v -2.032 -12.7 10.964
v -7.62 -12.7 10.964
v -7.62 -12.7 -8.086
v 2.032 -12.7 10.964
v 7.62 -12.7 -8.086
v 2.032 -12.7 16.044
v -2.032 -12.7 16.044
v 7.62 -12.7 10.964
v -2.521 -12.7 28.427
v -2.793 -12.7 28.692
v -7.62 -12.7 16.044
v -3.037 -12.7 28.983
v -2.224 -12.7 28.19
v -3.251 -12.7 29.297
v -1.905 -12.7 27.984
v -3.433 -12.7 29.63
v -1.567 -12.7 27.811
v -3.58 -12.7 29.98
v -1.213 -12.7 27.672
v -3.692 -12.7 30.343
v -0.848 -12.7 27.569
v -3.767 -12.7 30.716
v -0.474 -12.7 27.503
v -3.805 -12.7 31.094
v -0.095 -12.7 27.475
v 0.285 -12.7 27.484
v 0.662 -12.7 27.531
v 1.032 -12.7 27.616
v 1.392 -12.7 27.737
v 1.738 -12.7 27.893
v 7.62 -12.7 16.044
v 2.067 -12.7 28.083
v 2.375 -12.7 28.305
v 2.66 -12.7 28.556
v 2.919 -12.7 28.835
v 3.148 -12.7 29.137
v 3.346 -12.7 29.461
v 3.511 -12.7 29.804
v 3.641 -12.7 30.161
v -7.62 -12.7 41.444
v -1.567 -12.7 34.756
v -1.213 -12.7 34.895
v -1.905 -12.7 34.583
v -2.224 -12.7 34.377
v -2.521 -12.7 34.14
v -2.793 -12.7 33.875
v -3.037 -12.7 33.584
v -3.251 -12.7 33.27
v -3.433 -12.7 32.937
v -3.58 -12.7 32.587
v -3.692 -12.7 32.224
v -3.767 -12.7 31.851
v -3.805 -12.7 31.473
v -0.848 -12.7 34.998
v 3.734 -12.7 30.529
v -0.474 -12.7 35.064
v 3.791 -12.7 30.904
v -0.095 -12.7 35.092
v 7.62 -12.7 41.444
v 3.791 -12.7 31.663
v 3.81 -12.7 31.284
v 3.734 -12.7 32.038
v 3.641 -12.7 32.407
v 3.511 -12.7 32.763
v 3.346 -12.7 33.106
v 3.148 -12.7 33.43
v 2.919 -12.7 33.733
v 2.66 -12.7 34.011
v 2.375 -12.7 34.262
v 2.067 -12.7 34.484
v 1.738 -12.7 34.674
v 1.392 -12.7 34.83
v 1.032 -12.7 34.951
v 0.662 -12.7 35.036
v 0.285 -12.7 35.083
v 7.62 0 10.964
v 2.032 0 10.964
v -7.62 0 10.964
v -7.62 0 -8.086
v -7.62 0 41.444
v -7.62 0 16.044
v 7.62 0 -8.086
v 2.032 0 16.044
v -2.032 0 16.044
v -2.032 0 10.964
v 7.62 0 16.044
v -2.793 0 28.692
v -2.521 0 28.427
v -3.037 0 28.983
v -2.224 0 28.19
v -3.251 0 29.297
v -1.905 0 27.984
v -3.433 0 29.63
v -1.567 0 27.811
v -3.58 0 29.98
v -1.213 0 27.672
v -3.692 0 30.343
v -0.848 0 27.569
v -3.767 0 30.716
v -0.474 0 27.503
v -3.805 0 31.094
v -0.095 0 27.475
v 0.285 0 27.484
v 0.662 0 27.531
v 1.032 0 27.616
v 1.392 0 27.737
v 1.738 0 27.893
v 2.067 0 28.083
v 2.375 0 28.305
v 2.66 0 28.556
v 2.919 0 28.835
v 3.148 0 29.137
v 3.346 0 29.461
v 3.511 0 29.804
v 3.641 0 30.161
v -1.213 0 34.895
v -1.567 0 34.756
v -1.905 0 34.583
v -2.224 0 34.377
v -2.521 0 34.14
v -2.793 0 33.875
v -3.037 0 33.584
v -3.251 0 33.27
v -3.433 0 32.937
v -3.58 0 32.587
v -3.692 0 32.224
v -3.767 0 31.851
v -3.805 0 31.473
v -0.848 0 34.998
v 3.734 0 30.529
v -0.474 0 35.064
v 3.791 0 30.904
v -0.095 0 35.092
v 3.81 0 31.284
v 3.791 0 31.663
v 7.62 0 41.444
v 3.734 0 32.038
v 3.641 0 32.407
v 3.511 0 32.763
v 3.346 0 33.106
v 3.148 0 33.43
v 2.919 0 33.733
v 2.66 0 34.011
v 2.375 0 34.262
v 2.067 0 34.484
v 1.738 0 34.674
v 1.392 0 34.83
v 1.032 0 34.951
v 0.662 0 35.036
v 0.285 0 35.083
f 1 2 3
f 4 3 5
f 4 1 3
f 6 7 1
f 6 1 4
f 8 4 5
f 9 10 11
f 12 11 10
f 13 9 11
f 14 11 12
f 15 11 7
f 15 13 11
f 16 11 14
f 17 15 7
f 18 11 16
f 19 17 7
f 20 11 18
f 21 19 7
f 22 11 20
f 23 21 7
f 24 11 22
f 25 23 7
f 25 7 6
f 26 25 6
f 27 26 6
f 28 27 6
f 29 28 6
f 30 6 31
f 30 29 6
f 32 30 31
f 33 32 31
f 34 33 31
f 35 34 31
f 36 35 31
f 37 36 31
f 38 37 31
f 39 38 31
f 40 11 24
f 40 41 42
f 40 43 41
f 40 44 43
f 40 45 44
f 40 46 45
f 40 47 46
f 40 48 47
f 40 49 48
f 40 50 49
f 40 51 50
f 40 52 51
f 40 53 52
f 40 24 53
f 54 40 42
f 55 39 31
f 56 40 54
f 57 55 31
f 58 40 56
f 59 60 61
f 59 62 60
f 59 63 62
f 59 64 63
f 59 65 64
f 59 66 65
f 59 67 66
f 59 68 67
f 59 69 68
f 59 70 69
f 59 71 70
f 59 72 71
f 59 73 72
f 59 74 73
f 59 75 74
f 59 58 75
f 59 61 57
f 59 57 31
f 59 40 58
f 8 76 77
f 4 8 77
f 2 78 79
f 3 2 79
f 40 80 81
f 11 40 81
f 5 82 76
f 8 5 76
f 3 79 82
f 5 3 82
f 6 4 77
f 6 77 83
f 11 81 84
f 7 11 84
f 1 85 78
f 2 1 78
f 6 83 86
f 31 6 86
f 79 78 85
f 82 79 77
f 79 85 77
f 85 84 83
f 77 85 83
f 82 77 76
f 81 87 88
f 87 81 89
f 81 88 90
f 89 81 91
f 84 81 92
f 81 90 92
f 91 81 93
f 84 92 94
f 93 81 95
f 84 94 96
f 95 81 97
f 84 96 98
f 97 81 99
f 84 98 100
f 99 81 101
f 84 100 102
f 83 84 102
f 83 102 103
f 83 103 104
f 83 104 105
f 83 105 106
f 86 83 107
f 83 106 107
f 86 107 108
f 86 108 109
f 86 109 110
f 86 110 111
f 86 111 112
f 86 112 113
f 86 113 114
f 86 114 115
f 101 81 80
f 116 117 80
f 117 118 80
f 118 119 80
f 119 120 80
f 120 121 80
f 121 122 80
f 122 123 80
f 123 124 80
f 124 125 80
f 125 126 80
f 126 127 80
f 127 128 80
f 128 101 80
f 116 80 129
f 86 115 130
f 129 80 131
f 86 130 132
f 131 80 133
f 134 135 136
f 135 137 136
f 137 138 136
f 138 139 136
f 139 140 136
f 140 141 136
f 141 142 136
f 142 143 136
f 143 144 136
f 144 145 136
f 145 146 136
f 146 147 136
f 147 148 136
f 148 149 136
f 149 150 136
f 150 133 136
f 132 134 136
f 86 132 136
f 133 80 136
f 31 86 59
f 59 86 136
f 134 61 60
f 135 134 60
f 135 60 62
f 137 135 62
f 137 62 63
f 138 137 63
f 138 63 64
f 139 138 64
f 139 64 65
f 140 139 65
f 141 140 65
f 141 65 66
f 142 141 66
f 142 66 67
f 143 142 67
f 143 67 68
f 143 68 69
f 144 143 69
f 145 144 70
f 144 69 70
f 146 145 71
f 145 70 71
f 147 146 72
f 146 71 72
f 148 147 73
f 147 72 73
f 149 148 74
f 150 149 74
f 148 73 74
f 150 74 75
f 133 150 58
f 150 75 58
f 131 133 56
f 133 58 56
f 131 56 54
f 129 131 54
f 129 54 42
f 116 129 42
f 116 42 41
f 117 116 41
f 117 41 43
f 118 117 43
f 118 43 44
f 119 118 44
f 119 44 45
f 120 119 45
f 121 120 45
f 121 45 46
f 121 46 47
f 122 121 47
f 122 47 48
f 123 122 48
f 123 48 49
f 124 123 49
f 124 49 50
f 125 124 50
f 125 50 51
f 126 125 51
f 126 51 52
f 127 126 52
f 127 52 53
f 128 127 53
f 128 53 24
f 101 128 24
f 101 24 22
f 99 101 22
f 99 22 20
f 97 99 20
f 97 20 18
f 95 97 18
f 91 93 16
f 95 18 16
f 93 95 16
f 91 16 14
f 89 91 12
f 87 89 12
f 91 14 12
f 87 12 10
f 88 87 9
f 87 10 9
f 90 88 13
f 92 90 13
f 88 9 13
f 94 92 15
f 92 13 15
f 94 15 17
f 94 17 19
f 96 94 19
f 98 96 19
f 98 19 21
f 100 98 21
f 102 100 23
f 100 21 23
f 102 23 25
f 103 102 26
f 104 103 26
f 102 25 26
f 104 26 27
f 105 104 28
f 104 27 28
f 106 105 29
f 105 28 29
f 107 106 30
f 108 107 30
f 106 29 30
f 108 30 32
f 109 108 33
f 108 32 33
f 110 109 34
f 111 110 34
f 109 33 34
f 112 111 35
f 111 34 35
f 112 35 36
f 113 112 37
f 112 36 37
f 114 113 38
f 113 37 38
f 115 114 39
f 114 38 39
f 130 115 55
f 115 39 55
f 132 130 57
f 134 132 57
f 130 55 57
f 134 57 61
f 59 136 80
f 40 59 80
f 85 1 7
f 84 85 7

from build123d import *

# Parameters (mm, degrees)
F0_W     = 4.064
F0_H     = 5.08
F1_DEPTH = 12.7
F2_R     = 3.81
F3_DEPTH = 25.4


with BuildPart() as f1:
    # F0 (on Front) → F1 (new body)
    with BuildSketch(Plane.XZ):
        Polygon((-7.62, -8.086451), (0, -8.086451), (7.62, -8.086451), (7.62, 10.963549), (3.556, 10.963549), (2.032, 10.963549), (-2.032, 10.963549), (-3.556, 10.963549), (-7.62, 10.963549), align=None)
        with Locations((0, 13.503549)):
            Rectangle(F0_W, F0_H)
        Polygon((-3.556, 16.043549), (-2.032, 16.043549), (2.032, 16.043549), (3.556, 16.043549), (7.62, 16.043549), (7.62, 41.443549), (0, 41.443549), (-7.62, 41.443549), (-7.62, 16.043549), align=None)
    extrude(amount=F1_DEPTH)

    # F2 (on face) → F3 (cut)
    with BuildSketch(Plane.XZ.offset(12.7)):
        with Locations((0, 31.283549)):
            Circle(F2_R)
    extrude(amount=-F3_DEPTH, mode=Mode.SUBTRACT)


solid = f1.part
